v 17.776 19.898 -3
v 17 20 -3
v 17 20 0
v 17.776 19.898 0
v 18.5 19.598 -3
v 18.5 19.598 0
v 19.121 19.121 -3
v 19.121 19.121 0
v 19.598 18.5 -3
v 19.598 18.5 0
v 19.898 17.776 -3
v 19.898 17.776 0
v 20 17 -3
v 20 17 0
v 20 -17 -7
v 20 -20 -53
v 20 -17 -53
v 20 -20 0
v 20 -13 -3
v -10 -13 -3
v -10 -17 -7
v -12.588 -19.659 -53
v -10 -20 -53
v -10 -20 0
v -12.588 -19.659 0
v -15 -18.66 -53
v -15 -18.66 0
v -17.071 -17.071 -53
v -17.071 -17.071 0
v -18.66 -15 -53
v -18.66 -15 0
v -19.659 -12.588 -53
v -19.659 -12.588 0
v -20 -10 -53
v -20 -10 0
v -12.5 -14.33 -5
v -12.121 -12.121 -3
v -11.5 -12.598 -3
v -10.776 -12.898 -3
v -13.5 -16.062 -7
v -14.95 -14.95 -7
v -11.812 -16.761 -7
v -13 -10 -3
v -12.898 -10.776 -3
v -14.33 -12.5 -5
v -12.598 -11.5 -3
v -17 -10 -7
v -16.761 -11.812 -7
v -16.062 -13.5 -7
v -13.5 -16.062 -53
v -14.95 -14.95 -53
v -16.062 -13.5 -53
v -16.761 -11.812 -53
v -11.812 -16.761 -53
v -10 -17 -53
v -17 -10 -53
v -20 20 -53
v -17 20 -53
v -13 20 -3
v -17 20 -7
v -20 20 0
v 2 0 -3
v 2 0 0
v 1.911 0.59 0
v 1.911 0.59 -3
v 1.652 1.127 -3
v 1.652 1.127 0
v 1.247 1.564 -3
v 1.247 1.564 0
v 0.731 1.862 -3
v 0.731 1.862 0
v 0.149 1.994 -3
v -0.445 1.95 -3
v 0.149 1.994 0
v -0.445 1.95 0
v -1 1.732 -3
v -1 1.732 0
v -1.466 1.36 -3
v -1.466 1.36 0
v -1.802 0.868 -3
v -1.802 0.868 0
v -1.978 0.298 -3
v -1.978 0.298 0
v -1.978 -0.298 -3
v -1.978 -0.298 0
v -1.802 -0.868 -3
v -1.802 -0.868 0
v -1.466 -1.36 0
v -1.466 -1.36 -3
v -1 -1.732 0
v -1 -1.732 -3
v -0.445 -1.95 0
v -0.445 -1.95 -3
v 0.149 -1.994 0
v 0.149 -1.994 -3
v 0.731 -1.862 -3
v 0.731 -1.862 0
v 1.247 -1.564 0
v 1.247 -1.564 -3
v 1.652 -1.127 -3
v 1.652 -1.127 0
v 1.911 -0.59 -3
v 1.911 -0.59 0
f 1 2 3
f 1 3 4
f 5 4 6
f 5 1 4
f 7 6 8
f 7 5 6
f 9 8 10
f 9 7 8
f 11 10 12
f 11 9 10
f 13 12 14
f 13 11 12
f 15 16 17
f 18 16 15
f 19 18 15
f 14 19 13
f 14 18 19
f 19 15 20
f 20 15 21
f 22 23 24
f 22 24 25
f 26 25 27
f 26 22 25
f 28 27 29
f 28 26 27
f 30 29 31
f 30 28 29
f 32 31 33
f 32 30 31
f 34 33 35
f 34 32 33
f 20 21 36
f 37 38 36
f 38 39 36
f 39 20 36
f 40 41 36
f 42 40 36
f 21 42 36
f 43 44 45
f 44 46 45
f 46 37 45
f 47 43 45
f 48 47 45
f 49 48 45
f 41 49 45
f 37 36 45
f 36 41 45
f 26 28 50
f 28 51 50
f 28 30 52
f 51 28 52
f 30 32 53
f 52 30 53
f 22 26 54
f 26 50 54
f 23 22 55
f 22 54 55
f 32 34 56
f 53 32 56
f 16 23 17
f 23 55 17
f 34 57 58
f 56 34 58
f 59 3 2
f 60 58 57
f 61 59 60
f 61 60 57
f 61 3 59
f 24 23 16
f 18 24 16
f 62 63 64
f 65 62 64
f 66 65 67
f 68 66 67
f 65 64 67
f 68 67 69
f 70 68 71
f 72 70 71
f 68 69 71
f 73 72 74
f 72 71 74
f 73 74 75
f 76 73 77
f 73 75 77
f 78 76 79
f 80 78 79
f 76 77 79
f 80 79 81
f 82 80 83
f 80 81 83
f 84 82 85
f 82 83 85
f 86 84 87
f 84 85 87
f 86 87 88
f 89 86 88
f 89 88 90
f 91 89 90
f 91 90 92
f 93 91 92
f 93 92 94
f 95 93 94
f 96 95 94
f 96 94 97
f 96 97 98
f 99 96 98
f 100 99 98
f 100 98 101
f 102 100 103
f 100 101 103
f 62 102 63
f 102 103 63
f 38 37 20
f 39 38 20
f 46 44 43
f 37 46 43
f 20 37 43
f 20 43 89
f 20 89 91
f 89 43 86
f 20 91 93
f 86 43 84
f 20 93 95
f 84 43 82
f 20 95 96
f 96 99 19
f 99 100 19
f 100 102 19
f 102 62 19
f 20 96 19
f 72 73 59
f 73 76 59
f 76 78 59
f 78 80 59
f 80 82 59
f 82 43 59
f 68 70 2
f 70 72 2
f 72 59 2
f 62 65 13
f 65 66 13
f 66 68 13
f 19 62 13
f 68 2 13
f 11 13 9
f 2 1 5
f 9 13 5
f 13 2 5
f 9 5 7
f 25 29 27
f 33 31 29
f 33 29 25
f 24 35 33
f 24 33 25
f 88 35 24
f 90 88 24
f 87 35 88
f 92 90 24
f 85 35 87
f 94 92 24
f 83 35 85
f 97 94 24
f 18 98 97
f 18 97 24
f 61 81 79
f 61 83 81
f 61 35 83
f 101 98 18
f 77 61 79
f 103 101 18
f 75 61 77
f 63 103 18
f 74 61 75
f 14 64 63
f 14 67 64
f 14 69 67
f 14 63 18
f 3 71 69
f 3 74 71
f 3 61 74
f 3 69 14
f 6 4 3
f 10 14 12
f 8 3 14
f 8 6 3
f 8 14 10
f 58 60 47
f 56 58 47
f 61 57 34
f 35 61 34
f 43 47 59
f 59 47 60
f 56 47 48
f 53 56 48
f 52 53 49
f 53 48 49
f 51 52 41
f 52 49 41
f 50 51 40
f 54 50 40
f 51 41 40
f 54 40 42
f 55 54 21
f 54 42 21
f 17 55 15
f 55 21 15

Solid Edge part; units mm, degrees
sketch "Sketch1" plane through (0, 0, 0) normal (0, 0, 1) x (1, 0, 0)
  circle A0 centre (0, 0) radius 2
  line L0 (-20, 20) -> (-20, -20)
  line L1 (-20, -20) -> (20, -20)
  line L2 (20, -20) -> (20, 20)
  line L3 (20, 20) -> (-20, 20)
  dimension "D1" = 40
  dimension "D2" = 40
  dimension "D3" = 4
extrude "Protrusion1" add sketch "Sketch1" against normal blind 3
fillet "Redondeo_1" radius 10 1 edges at (-20, -20, -1.5)
sketch "Sketch2" plane through (0, 0, -3) normal (0, 0, -1) x (1, 0, 0)
  line L0 (-17, -20) -> (-20, -20)
  line L1 (-20, -20) -> (-20, 10)
  arc A0 (-20, 10) -> (-10, 20) centre (-10, 10) cw
  line L2 (-10, 20) -> (20, 20)
  line L3 (20, 17) -> (20, 20)
  line L4 (-10, 17) -> (20, 17)
  arc A1 (-17, 10) -> (-10, 17) centre (-10, 10) cw
  line L5 (-17, -20) -> (-17, 10)
extrude "ProtrusiónExtruida_2" add sketch "Sketch2" along normal blind 50
chamfer "Chaflán_1" distance 4 angle 45 3 edges at (5, -17, -3) (-14.9497, -14.9497, -3) (-17, 5, -3)
fillet "Redondeo_2" radius 3 1 edges at (20, 20, -1.5)
